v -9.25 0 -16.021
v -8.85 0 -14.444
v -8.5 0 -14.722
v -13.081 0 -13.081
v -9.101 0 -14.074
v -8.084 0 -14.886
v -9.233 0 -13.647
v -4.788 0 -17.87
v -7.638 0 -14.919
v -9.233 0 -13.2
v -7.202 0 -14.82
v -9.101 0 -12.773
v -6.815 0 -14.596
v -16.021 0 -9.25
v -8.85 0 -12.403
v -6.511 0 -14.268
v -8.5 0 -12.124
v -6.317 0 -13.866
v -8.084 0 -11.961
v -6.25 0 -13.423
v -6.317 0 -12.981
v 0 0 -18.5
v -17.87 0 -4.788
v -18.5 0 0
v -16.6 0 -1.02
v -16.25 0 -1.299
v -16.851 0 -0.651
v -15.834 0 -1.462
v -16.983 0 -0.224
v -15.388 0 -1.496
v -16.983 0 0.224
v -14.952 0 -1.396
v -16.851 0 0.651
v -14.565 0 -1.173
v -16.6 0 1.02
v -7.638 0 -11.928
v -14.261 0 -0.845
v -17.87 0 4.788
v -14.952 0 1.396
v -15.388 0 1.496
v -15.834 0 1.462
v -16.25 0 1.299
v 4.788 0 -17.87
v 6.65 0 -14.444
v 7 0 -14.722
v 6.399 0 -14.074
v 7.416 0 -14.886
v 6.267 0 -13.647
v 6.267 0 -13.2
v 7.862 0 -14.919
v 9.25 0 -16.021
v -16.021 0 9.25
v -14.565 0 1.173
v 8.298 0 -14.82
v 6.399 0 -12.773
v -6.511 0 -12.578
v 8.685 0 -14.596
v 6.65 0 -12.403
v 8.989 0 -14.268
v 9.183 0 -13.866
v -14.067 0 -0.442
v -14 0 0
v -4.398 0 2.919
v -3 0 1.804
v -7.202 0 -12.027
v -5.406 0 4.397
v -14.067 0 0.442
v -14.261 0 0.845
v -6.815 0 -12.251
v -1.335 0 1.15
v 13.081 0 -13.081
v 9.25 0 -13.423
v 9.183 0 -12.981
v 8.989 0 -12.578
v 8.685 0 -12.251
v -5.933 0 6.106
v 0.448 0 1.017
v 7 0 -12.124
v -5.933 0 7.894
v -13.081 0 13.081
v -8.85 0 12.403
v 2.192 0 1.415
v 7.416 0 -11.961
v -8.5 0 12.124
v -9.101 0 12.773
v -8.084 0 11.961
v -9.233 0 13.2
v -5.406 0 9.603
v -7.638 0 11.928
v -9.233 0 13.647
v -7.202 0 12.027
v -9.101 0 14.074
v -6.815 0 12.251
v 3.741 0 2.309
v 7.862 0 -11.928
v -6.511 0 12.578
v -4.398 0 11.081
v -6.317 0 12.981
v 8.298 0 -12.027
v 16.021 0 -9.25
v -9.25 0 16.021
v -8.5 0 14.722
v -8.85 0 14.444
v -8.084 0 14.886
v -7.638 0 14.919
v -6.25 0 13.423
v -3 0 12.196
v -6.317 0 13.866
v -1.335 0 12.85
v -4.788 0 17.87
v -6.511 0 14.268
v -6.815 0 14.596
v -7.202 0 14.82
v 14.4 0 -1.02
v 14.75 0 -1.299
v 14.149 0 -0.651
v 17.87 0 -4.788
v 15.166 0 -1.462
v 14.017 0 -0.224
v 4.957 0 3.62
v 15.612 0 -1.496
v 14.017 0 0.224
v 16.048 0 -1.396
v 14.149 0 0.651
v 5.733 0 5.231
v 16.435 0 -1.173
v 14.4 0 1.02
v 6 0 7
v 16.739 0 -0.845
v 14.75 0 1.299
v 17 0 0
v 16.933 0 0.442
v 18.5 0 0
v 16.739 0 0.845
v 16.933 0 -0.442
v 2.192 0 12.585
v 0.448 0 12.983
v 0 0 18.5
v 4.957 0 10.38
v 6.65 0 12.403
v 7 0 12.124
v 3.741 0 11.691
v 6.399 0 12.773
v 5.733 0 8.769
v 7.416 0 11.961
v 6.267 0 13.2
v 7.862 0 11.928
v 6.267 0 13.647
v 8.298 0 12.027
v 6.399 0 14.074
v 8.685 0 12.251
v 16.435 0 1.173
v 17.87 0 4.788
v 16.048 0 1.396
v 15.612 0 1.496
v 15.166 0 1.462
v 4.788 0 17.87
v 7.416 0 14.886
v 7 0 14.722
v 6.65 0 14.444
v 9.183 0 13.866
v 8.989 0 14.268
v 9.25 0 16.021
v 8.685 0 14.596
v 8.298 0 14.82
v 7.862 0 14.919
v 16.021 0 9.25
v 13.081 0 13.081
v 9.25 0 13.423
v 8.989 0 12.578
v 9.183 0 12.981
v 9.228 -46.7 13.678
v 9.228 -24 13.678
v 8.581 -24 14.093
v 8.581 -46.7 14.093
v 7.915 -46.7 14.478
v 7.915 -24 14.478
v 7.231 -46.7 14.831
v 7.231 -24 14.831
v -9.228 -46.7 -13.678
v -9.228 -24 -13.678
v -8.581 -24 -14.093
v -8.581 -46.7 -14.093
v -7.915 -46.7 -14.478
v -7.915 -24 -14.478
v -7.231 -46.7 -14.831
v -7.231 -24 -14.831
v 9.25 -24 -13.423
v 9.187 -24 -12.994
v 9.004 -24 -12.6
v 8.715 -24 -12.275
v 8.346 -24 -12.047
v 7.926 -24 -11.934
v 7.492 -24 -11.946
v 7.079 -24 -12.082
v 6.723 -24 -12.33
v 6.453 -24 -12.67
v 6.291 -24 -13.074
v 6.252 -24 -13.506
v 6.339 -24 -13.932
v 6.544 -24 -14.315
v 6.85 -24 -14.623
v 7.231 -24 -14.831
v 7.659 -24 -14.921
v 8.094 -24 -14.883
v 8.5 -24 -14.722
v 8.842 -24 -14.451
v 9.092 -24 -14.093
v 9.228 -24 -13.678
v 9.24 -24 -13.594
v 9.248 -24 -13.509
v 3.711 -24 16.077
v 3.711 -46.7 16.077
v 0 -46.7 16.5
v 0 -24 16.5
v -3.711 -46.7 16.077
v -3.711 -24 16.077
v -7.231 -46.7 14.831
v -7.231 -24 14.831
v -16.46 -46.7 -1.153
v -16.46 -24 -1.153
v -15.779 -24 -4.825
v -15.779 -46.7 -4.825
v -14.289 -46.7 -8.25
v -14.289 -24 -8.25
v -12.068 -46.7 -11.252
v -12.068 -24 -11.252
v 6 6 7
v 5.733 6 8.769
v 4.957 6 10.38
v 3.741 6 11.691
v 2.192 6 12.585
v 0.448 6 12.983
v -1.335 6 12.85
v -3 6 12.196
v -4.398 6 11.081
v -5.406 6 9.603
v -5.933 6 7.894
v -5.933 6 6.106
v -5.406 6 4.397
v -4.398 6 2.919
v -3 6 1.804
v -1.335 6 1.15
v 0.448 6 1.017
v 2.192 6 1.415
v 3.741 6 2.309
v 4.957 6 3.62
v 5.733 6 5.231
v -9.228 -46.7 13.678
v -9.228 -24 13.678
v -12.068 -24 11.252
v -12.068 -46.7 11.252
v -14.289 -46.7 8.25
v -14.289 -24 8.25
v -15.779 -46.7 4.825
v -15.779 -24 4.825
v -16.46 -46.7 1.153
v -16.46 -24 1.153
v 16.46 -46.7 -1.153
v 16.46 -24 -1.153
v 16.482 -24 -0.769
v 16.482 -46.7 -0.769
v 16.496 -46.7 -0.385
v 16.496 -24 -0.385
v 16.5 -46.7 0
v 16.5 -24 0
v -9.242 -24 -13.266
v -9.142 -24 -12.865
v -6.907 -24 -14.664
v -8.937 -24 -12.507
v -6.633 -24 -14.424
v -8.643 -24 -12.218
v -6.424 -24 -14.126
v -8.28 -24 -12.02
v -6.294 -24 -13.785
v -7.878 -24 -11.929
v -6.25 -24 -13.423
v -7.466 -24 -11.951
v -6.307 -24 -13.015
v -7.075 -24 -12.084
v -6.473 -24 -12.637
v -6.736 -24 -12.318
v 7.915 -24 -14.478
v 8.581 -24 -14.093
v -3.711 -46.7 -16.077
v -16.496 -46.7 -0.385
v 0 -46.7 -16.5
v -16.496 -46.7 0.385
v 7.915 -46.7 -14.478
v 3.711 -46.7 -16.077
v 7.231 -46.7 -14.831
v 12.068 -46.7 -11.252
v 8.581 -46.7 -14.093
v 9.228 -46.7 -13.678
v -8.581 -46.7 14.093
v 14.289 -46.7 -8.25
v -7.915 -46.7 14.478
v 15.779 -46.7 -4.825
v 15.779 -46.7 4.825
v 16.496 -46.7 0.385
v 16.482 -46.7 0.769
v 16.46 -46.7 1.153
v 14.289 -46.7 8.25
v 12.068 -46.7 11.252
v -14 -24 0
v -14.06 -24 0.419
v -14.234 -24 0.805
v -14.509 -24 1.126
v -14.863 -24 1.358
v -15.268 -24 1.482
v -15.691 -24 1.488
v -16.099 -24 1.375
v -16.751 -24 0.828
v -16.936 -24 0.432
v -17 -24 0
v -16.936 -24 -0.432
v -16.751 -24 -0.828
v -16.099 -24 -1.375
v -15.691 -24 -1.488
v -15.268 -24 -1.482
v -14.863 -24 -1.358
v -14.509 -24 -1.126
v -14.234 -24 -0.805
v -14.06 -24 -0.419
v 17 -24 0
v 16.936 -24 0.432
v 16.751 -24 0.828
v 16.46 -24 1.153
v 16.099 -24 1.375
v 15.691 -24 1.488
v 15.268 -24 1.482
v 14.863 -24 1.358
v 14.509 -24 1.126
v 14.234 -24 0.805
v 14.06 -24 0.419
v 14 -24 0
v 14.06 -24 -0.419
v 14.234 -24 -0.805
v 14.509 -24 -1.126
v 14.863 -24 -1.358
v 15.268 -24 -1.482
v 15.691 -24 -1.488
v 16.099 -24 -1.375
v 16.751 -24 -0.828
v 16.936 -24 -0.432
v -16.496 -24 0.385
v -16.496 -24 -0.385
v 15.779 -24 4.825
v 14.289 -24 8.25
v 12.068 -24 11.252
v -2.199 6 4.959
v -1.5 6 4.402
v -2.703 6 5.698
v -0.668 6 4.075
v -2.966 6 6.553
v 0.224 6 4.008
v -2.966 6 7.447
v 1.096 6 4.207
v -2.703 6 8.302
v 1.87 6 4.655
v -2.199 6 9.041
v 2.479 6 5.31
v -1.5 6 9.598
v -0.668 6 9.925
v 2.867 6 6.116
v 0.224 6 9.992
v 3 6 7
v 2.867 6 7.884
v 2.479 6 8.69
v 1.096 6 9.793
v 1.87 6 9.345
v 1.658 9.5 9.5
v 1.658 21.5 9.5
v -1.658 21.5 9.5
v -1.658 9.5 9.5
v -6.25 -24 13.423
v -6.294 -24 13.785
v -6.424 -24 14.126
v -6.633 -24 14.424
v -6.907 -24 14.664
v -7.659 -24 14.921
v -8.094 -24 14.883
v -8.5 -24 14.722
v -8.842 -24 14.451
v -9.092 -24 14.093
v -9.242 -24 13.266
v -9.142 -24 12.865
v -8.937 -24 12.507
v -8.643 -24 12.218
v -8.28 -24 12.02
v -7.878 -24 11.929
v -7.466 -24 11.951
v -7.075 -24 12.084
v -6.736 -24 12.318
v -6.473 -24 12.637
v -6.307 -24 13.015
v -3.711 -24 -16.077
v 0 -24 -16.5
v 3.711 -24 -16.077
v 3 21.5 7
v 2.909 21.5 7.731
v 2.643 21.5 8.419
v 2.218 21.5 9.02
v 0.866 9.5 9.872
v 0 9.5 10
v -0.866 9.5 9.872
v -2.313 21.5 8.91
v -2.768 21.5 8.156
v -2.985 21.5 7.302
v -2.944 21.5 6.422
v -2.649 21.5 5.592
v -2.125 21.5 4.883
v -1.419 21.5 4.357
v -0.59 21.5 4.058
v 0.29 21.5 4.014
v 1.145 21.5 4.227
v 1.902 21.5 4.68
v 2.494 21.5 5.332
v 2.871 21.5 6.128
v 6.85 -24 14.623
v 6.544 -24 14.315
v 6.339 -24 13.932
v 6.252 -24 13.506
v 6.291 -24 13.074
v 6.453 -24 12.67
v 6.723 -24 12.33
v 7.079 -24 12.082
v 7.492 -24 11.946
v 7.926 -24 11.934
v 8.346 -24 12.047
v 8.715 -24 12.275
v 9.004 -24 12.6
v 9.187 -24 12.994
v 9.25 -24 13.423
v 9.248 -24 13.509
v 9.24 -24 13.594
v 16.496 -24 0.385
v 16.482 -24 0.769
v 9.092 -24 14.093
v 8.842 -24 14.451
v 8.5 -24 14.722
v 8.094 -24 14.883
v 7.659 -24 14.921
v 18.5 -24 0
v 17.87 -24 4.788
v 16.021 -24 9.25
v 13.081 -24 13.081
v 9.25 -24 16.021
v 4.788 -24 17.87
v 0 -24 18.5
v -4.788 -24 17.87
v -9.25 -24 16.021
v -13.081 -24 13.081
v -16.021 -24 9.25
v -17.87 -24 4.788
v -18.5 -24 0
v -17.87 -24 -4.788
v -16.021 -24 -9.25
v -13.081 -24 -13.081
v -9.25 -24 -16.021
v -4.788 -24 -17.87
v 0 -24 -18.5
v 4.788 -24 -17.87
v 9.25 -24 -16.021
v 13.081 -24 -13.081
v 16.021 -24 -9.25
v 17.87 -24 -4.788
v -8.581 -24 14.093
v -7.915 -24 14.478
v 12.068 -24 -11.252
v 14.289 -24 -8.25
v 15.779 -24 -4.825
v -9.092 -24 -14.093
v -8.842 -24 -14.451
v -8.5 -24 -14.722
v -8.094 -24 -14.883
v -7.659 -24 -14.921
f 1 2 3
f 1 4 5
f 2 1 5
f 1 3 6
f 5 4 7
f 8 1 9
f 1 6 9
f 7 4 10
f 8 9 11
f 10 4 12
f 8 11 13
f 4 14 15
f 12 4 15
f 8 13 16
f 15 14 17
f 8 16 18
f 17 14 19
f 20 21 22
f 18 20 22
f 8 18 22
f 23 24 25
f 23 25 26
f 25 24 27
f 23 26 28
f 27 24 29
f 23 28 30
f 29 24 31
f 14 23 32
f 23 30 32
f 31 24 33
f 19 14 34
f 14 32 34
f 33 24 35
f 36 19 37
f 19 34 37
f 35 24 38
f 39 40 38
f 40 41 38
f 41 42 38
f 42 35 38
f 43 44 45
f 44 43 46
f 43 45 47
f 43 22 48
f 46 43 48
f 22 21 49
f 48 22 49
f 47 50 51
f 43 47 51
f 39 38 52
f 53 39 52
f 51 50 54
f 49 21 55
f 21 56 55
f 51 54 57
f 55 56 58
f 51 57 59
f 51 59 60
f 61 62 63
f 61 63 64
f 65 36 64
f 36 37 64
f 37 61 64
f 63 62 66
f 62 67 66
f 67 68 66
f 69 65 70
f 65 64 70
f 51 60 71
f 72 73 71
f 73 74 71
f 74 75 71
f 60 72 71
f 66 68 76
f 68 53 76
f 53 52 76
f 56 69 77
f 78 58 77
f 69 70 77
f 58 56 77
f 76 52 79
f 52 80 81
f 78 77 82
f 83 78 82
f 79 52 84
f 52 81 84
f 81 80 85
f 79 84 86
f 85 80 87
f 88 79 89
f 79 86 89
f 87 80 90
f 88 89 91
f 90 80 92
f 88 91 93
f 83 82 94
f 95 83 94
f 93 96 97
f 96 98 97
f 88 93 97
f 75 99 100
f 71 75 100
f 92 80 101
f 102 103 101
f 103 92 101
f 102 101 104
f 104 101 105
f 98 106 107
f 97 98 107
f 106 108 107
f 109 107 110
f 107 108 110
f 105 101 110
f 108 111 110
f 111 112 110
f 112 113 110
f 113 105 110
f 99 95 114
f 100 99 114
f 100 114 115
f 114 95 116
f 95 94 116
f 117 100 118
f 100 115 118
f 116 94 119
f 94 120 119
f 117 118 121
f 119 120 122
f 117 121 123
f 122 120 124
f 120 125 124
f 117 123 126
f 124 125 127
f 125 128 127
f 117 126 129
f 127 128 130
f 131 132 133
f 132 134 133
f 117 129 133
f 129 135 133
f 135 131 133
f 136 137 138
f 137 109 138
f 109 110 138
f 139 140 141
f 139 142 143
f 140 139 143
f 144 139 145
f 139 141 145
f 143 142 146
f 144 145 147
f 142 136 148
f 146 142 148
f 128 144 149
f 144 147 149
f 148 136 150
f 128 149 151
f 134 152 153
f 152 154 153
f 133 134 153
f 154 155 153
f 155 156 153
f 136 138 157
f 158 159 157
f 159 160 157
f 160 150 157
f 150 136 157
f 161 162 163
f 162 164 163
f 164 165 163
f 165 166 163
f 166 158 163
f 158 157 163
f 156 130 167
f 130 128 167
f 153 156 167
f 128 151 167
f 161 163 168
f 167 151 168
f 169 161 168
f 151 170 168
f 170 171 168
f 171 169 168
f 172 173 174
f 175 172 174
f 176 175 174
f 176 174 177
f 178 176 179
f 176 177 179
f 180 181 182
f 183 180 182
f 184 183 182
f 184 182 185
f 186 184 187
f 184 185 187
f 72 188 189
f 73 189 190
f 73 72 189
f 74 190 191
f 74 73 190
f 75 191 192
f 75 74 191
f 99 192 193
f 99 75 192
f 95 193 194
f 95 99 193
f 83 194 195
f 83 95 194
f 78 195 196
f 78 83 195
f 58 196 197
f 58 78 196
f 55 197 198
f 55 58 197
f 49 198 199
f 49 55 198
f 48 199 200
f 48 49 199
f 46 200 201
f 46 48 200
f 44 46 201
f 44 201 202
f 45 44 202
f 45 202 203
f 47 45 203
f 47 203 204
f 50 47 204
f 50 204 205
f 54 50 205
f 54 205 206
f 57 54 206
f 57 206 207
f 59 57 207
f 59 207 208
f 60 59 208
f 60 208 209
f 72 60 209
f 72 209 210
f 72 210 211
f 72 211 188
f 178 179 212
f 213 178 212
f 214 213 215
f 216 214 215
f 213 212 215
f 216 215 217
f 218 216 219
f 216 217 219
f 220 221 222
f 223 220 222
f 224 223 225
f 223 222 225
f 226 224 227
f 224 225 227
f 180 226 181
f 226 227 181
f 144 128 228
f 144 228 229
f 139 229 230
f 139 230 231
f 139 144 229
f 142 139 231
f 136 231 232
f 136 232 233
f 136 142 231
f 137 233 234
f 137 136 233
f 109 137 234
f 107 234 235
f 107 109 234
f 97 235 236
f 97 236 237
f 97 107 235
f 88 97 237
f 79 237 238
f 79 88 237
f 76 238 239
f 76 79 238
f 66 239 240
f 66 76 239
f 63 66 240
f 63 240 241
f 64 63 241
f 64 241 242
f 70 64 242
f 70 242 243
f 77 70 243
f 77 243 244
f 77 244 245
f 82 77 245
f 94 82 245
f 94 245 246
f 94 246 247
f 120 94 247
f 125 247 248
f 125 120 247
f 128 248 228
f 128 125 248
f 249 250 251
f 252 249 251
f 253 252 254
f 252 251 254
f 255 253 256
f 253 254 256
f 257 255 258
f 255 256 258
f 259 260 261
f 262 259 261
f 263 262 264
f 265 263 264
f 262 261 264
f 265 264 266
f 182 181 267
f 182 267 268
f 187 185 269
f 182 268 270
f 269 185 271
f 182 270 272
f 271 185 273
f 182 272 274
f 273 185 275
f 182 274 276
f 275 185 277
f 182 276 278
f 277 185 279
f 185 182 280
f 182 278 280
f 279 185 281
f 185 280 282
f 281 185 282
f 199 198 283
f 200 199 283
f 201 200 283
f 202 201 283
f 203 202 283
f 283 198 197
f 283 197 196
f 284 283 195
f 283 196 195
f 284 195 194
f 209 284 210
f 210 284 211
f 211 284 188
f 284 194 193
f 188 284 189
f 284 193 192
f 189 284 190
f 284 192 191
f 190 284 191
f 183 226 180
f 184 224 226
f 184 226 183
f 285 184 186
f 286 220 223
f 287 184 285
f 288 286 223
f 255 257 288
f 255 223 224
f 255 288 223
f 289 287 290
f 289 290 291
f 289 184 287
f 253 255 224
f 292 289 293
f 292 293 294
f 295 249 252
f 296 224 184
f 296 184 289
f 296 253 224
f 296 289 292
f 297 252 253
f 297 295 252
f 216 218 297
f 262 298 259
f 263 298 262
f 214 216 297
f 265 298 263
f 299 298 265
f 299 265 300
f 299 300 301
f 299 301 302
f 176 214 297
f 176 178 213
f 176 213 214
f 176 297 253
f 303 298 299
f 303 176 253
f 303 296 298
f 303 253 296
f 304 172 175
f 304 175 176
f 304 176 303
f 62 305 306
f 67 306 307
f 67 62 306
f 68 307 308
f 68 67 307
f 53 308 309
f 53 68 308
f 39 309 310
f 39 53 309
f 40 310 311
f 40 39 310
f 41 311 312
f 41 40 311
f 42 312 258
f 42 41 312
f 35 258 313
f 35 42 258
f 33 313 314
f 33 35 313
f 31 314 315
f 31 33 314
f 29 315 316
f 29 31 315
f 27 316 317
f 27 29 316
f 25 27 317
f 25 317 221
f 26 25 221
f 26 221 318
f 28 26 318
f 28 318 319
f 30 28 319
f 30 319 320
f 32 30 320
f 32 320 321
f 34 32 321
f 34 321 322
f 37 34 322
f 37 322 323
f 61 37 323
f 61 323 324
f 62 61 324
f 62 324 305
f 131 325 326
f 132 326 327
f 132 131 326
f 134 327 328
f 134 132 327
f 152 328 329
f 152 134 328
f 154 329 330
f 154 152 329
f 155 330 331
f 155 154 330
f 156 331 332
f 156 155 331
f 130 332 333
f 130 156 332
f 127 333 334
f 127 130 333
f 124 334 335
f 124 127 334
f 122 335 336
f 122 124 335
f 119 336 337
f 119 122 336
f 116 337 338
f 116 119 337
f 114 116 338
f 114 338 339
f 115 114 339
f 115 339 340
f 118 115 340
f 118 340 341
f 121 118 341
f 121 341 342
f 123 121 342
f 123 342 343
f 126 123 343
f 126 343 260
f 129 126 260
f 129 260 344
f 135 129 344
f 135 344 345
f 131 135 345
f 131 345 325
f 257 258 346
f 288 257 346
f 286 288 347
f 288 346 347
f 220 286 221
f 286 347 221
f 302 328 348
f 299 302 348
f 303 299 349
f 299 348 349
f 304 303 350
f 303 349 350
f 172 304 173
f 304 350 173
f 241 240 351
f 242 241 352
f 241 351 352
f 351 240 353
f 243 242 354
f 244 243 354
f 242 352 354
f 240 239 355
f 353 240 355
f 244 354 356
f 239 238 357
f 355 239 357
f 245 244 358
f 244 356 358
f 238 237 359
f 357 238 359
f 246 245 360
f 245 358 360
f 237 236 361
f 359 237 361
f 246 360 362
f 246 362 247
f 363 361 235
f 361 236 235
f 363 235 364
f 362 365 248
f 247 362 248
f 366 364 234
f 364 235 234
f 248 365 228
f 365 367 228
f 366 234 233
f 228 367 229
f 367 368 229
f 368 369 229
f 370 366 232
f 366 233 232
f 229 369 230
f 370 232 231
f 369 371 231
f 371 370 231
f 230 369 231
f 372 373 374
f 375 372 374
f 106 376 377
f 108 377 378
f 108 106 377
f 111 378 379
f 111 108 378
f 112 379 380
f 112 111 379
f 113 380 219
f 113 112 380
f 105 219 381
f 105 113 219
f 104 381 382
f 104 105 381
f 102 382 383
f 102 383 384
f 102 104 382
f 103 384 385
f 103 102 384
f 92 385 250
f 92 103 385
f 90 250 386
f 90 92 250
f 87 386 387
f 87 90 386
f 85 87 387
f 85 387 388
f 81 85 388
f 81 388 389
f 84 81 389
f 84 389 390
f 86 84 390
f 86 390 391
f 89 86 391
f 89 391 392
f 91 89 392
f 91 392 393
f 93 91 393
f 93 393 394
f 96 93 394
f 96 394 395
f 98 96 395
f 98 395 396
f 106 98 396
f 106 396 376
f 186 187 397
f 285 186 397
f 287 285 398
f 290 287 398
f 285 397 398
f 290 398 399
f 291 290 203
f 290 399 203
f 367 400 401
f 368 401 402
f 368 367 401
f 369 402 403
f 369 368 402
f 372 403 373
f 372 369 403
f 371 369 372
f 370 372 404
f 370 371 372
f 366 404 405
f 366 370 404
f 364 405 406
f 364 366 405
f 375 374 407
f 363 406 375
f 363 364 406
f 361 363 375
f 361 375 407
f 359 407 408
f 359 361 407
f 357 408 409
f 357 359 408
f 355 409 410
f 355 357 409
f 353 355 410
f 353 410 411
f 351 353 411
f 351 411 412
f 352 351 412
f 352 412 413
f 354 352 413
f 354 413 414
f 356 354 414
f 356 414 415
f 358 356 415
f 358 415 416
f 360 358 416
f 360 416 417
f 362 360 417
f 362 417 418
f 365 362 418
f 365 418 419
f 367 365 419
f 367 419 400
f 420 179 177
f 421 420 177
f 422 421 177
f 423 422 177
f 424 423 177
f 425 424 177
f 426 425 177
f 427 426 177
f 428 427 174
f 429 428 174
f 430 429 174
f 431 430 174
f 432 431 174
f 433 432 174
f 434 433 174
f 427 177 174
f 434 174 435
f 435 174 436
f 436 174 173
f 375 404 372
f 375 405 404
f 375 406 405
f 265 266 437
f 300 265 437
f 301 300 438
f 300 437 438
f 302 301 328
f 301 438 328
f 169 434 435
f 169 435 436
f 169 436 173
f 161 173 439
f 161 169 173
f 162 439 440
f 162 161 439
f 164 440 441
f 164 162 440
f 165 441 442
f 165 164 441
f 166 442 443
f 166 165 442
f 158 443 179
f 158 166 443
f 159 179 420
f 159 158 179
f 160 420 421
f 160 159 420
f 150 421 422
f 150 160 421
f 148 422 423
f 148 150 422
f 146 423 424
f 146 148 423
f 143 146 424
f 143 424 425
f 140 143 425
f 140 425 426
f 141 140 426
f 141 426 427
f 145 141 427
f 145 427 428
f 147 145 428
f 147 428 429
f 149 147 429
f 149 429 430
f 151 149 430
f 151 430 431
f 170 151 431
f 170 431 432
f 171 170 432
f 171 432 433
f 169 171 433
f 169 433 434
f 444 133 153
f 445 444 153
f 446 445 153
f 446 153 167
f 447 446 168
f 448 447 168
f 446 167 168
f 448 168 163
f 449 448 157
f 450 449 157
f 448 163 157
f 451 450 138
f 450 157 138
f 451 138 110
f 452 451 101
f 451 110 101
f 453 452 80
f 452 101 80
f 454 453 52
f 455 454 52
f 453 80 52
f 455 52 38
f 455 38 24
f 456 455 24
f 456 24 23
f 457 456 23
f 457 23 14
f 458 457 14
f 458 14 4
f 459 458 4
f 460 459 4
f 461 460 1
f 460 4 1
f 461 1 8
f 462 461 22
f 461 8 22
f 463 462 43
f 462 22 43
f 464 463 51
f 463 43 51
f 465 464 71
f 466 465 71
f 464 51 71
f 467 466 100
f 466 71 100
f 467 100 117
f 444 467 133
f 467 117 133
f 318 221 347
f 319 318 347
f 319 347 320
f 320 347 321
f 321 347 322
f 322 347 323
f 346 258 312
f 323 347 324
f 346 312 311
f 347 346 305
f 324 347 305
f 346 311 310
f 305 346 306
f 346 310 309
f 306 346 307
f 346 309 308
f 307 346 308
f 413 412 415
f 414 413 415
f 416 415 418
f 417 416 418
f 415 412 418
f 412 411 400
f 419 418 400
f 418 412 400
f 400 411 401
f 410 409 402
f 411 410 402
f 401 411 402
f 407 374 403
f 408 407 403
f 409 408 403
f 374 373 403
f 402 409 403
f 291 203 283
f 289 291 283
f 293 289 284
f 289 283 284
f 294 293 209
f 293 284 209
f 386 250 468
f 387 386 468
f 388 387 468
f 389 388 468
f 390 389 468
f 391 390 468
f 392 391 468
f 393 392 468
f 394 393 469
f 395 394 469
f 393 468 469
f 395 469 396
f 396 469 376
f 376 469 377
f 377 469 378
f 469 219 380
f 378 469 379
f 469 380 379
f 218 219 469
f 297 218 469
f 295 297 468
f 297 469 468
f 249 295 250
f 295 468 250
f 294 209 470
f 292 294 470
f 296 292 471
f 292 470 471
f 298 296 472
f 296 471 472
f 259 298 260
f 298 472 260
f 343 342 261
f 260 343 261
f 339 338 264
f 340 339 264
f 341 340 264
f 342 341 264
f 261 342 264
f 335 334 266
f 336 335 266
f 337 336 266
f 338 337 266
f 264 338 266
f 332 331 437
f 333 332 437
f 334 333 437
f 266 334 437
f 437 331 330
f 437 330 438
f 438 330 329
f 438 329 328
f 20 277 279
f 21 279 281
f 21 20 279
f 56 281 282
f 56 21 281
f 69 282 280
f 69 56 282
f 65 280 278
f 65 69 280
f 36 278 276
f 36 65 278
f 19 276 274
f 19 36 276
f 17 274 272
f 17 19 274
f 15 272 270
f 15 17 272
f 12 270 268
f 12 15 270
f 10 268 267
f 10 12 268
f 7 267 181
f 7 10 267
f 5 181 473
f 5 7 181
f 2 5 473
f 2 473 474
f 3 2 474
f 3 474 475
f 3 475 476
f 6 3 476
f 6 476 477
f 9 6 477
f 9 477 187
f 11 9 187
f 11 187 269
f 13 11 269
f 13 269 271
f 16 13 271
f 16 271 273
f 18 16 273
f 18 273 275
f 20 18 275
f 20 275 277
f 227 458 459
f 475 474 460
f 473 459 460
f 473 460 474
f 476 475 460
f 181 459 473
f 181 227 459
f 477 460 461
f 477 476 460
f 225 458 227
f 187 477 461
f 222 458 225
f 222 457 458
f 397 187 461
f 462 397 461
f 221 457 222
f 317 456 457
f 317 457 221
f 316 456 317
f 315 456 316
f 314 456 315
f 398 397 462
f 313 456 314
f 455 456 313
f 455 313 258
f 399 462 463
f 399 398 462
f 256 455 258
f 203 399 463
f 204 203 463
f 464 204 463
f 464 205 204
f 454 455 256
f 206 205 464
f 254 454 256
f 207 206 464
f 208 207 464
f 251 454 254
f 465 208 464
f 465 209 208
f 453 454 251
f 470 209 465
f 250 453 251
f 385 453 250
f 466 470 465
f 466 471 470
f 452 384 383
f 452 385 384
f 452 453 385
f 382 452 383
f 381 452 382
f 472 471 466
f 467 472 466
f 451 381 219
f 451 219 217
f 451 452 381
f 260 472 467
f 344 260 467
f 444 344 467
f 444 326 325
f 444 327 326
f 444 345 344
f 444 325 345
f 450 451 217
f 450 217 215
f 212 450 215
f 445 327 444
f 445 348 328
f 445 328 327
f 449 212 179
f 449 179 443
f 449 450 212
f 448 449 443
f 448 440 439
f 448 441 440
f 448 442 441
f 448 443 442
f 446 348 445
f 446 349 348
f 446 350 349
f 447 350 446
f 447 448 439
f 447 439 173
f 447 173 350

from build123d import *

# Parameters (mm, degrees)
F0_R     = 18.5
F0_R_2   = 1.5
F0_R_3   = 6
F0_R_4   = 3
F1_DEPTH = 24
F2_DEPTH = 21.5
F3_DEPTH = 6
F5_DEPTH = 12
F7_DEPTH = 22.7


with BuildPart() as f1:
    # F0 (on Front) → F1 (new body)
    with BuildSketch(Plane.XZ):
        Circle(F0_R)
        with Locations((-7.75, -13.4233937587)):
            Circle(F0_R_2, mode=Mode.SUBTRACT)
        with Locations((7.75, -13.4233937587)):
            Circle(F0_R_2, mode=Mode.SUBTRACT)
        with Locations((-15.5, 0)):
            Circle(F0_R_2, mode=Mode.SUBTRACT)
        with Locations((-7.75, 13.4233937587)):
            Circle(F0_R_2, mode=Mode.SUBTRACT)
        with Locations((0, 7)):
            Circle(F0_R_3, mode=Mode.SUBTRACT)
        with Locations((15.5, 0)):
            Circle(F0_R_2, mode=Mode.SUBTRACT)
        with Locations((7.75, 13.4233937587)):
            Circle(F0_R_2, mode=Mode.SUBTRACT)
        with Locations((0, 7)):
            Circle(F0_R_3)
        with Locations((0, 7)):
            Circle(F0_R_4, mode=Mode.SUBTRACT)
        with Locations((0, 7)):
            Circle(F0_R_4)
    extrude(amount=F1_DEPTH)

    # F0 (on Front) → F2 (join)
    with BuildSketch(Plane.XZ):
        with Locations((0, 7)):
            Circle(F0_R_4)
    extrude(amount=-F2_DEPTH)

    # F0 (on Front) → F3 (join)
    with BuildSketch(Plane.XZ):
        with Locations((0, 7)):
            Circle(F0_R_3)
        with Locations((0, 7)):
            Circle(F0_R_4, mode=Mode.SUBTRACT)
    extrude(amount=-F3_DEPTH)

    # F4 (on face) → F5 (cut)
    with BuildSketch(Plane(origin=(0, 21.5, 0), x_dir=(-1, 0, 0), z_dir=(0, 1, 0))):
        with BuildLine():
            ThreePointArc((1.6583123952, 9.5), (0, 10), (-1.6583123952, 9.5))
            Line((-1.6583123952, 9.5), (1.6583123952, 9.5))
        make_face()
        with BuildLine():
            Line((-2, 10.5), (-2, 9.5))
            Line((-2, 9.5), (-1.6583123952, 9.5))
            ThreePointArc((-1.6583123952, 9.5), (0, 10), (1.6583123952, 9.5))
            Line((1.6583123952, 9.5), (2, 9.5))
            Line((2, 9.5), (2, 10.5))
            Line((2, 10.5), (-2, 10.5))
        make_face()
    extrude(amount=-F5_DEPTH, mode=Mode.SUBTRACT)

    # F6 (on face) → F7 (join)
    with BuildSketch(Plane.XZ.offset(24)):
        with BuildLine():
            ThreePointArc((16.4596774194, -1.1528309723), (14, 0), (16.4596774194, 1.1528309723))
            ThreePointArc((16.4596774194, 1.1528309723), (14.2894191624, 8.25), (9.228219618, 13.6780832971))
            ThreePointArc((9.228219618, 13.6780832971), (9.2445449854, 13.5512033299), (9.25, 13.4233937587))
            ThreePointArc((9.25, 13.4233937587), (6.8920411717, 12.1929846198), (7.2314578014, 14.8309142694))
            ThreePointArc((7.2314578014, 14.8309142694), (0, 16.5), (-7.2314578014, 14.8309142694))
            ThreePointArc((-7.2314578014, 14.8309142694), (-6.5195908611, 14.2813525869), (-6.25, 13.4233937587))
            ThreePointArc((-6.25, 13.4233937587), (-7.8778095713, 11.9288487732), (-9.228219618, 13.6780832971))
            ThreePointArc((-9.228219618, 13.6780832971), (-14.2894191624, 8.25), (-16.4596774194, 1.1528309723))
            ThreePointArc((-16.4596774194, 1.1528309723), (-14.8634138428, 1.3582187101), (-14, 0))
            ThreePointArc((-14, 0), (-14.8634138428, -1.3582187101), (-16.4596774194, -1.1528309723))
            ThreePointArc((-16.4596774194, -1.1528309723), (-14.2894191624, -8.25), (-9.228219618, -13.6780832971))
            ThreePointArc((-9.228219618, -13.6780832971), (-7.8778095713, -11.9288487732), (-6.25, -13.4233937587))
            ThreePointArc((-6.25, -13.4233937587), (-6.5195908611, -14.2813525869), (-7.2314578014, -14.8309142694))
            ThreePointArc((-7.2314578014, -14.8309142694), (0, -16.5), (7.2314578014, -14.8309142694))
            ThreePointArc((7.2314578014, -14.8309142694), (6.8920411717, -12.1929846198), (9.25, -13.4233937587))
            ThreePointArc((9.25, -13.4233937587), (9.2445449854, -13.5512033299), (9.228219618, -13.6780832971))
            ThreePointArc((9.228219618, -13.6780832971), (14.2894191624, -8.25), (16.4596774194, -1.1528309723))
        make_face()
        with BuildLine():
            ThreePointArc((9.25, 13.4233937587), (9.2445449854, 13.5512033299), (9.228219618, 13.6780832971))
            ThreePointArc((9.228219618, 13.6780832971), (8.25, 14.2894191624), (7.2314578014, 14.8309142694))
            ThreePointArc((7.2314578014, 14.8309142694), (6.8920411717, 12.1929846198), (9.25, 13.4233937587))
        make_face()
        with BuildLine():
            ThreePointArc((-6.25, 13.4233937587), (-6.5195908611, 14.2813525869), (-7.2314578014, 14.8309142694))
            ThreePointArc((-7.2314578014, 14.8309142694), (-8.25, 14.2894191624), (-9.228219618, 13.6780832971))
            ThreePointArc((-9.228219618, 13.6780832971), (-7.8778095713, 11.9288487732), (-6.25, 13.4233937587))
        make_face()
        with BuildLine():
            ThreePointArc((16.4596774194, -1.1528309723), (16.4899162736, -0.5767679692), (16.5, 0))
            ThreePointArc((16.5, 0), (16.4899162736, 0.5767679692), (16.4596774194, 1.1528309723))
            ThreePointArc((16.4596774194, 1.1528309723), (14, 0), (16.4596774194, -1.1528309723))
        make_face()
        with BuildLine():
            ThreePointArc((-14, 0), (-14.8634138428, 1.3582187101), (-16.4596774194, 1.1528309723))
            ThreePointArc((-16.4596774194, 1.1528309723), (-16.5, 0), (-16.4596774194, -1.1528309723))
            ThreePointArc((-16.4596774194, -1.1528309723), (-14.8634138428, -1.3582187101), (-14, 0))
        make_face()
        with BuildLine():
            ThreePointArc((-9.228219618, -13.6780832971), (-8.25, -14.2894191624), (-7.2314578014, -14.8309142694))
            ThreePointArc((-7.2314578014, -14.8309142694), (-6.5195908611, -14.2813525869), (-6.25, -13.4233937587))
            ThreePointArc((-6.25, -13.4233937587), (-7.8778095713, -11.9288487732), (-9.228219618, -13.6780832971))
        make_face()
        with BuildLine():
            ThreePointArc((7.2314578014, -14.8309142694), (8.25, -14.2894191624), (9.228219618, -13.6780832971))
            ThreePointArc((9.228219618, -13.6780832971), (9.2445449854, -13.5512033299), (9.25, -13.4233937587))
            ThreePointArc((9.25, -13.4233937587), (6.8920411717, -12.1929846198), (7.2314578014, -14.8309142694))
        make_face()
    extrude(amount=F7_DEPTH)


solid = f1.part
